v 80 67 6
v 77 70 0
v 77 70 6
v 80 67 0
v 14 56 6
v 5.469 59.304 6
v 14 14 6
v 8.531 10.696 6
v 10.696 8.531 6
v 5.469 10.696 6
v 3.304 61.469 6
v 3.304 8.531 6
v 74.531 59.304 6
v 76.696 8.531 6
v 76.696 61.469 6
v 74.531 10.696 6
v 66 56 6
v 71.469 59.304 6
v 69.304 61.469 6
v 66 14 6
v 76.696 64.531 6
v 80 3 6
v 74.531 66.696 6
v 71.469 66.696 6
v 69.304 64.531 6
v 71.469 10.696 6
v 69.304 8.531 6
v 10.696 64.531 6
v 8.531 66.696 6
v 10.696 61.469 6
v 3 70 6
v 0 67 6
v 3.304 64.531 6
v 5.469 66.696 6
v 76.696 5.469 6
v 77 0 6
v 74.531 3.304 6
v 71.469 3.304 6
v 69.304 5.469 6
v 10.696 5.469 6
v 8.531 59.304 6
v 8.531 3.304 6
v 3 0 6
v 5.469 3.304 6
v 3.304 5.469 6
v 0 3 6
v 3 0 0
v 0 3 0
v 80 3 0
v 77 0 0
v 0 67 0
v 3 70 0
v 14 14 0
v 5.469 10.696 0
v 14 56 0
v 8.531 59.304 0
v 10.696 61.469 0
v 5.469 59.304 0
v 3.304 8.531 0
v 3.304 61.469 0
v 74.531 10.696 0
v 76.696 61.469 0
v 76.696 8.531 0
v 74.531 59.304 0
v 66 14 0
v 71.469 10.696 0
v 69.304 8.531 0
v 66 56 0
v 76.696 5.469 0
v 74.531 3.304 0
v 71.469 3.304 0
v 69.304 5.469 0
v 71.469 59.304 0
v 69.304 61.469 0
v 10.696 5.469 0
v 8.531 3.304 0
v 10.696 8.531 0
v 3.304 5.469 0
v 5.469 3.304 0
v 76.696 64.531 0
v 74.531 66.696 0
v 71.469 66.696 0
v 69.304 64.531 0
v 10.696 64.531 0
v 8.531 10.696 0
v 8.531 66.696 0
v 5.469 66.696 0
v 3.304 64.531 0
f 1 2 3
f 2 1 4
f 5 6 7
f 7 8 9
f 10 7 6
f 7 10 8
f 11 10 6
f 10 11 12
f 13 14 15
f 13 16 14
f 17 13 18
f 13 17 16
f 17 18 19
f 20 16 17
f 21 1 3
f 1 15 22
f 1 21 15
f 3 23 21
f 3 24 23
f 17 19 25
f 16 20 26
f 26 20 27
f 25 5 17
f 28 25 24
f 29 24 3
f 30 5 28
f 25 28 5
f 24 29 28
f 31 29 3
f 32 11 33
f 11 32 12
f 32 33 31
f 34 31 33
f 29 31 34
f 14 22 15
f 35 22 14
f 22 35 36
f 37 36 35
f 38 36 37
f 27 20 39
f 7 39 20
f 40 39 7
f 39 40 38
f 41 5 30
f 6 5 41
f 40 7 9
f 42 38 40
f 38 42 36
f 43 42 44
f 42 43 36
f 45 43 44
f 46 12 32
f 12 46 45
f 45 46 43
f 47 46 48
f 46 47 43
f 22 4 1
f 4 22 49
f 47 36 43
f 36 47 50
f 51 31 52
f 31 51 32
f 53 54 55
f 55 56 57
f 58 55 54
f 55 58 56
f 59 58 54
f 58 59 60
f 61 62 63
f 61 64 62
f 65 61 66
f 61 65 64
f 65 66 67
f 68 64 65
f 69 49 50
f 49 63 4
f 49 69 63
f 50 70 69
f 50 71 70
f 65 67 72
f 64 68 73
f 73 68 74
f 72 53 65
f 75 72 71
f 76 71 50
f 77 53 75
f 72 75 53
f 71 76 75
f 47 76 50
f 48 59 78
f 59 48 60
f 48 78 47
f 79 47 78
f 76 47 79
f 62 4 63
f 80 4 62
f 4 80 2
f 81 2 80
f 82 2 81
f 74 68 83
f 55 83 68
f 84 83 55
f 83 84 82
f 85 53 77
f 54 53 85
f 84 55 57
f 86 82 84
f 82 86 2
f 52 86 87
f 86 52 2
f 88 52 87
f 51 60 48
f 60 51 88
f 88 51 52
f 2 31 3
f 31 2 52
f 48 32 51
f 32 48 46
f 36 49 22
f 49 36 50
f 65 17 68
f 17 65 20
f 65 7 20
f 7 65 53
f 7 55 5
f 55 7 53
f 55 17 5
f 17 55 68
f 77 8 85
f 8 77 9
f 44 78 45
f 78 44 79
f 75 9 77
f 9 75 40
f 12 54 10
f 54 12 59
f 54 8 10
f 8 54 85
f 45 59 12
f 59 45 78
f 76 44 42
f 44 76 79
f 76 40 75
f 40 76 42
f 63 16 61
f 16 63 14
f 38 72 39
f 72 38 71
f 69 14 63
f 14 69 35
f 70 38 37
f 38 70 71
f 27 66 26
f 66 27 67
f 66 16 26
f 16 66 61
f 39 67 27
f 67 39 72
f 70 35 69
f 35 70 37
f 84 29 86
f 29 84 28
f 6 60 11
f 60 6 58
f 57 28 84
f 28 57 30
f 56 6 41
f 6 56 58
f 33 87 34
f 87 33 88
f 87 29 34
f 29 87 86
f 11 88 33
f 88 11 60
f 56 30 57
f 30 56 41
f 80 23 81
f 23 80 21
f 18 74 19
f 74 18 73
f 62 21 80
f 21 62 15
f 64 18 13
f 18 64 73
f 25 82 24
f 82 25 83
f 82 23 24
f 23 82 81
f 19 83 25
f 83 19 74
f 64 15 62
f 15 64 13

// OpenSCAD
$fn = 32;

// ----------------------------------------------------------------------
// Frame plate: 80 x 70 frame, 14 mm rails
// ----------------------------------------------------------------------

// --- parameters (mm) ---
plate_l = 80;             // plate length, X
plate_w = 70;             // plate width, Y
plate_t = 6;              // plate thickness, Z (extrusion height)
corner_c = 3;             // corner chamfer
frame_bar = 14;           // frame rail width
bolt_r = 4;               // corner bolt window radius
bolt_inset = 7;           // bolt centre inset from the edges

win_l = plate_l - 2 * frame_bar;  // window length
win_w = plate_w - 2 * frame_bar;  // window width
bolt_d = 2 * bolt_r;  // corner hole diameter

profile = [[3, 0], [77, 0], [80, 3], [80, 67], [77, 70], [3, 70], [0, 67], [0, 3]];  // primary outline, 8 points, counter clockwise
void_1 = [[14, 14], [66, 14], [66, 56], [14, 56]];  // the window, 4 points
void_2 = [[10.696, 8.531], [8.531, 10.696], [5.469, 10.696], [3.304, 8.531], [3.304, 5.469], [5.469, 3.304], [8.531, 3.304], [10.696, 5.469]];  // corner bolt window, 8 points
void_3 = [[76.696, 8.531], [74.531, 10.696], [71.469, 10.696], [69.304, 8.531], [69.304, 5.469], [71.469, 3.304], [74.531, 3.304], [76.696, 5.469]];  // corner bolt window, 8 points
void_4 = [[10.696, 64.531], [8.531, 66.696], [5.469, 66.696], [3.304, 64.531], [3.304, 61.469], [5.469, 59.304], [8.531, 59.304], [10.696, 61.469]];  // corner bolt window, 8 points
void_5 = [[76.696, 64.531], [74.531, 66.696], [71.469, 66.696], [69.304, 64.531], [69.304, 61.469], [71.469, 59.304], [74.531, 59.304], [76.696, 61.469]];  // corner bolt window, 8 points

// --- the one profile operation ---
difference() {
  linear_extrude(height = plate_t) polygon(points = profile);
  translate([0, 0, -1])
    linear_extrude(height = plate_t + 2) polygon(points = void_1);
  translate([0, 0, -1])
    linear_extrude(height = plate_t + 2) polygon(points = void_2);
  translate([0, 0, -1])
    linear_extrude(height = plate_t + 2) polygon(points = void_3);
  translate([0, 0, -1])
    linear_extrude(height = plate_t + 2) polygon(points = void_4);
  translate([0, 0, -1])
    linear_extrude(height = plate_t + 2) polygon(points = void_5);
}
